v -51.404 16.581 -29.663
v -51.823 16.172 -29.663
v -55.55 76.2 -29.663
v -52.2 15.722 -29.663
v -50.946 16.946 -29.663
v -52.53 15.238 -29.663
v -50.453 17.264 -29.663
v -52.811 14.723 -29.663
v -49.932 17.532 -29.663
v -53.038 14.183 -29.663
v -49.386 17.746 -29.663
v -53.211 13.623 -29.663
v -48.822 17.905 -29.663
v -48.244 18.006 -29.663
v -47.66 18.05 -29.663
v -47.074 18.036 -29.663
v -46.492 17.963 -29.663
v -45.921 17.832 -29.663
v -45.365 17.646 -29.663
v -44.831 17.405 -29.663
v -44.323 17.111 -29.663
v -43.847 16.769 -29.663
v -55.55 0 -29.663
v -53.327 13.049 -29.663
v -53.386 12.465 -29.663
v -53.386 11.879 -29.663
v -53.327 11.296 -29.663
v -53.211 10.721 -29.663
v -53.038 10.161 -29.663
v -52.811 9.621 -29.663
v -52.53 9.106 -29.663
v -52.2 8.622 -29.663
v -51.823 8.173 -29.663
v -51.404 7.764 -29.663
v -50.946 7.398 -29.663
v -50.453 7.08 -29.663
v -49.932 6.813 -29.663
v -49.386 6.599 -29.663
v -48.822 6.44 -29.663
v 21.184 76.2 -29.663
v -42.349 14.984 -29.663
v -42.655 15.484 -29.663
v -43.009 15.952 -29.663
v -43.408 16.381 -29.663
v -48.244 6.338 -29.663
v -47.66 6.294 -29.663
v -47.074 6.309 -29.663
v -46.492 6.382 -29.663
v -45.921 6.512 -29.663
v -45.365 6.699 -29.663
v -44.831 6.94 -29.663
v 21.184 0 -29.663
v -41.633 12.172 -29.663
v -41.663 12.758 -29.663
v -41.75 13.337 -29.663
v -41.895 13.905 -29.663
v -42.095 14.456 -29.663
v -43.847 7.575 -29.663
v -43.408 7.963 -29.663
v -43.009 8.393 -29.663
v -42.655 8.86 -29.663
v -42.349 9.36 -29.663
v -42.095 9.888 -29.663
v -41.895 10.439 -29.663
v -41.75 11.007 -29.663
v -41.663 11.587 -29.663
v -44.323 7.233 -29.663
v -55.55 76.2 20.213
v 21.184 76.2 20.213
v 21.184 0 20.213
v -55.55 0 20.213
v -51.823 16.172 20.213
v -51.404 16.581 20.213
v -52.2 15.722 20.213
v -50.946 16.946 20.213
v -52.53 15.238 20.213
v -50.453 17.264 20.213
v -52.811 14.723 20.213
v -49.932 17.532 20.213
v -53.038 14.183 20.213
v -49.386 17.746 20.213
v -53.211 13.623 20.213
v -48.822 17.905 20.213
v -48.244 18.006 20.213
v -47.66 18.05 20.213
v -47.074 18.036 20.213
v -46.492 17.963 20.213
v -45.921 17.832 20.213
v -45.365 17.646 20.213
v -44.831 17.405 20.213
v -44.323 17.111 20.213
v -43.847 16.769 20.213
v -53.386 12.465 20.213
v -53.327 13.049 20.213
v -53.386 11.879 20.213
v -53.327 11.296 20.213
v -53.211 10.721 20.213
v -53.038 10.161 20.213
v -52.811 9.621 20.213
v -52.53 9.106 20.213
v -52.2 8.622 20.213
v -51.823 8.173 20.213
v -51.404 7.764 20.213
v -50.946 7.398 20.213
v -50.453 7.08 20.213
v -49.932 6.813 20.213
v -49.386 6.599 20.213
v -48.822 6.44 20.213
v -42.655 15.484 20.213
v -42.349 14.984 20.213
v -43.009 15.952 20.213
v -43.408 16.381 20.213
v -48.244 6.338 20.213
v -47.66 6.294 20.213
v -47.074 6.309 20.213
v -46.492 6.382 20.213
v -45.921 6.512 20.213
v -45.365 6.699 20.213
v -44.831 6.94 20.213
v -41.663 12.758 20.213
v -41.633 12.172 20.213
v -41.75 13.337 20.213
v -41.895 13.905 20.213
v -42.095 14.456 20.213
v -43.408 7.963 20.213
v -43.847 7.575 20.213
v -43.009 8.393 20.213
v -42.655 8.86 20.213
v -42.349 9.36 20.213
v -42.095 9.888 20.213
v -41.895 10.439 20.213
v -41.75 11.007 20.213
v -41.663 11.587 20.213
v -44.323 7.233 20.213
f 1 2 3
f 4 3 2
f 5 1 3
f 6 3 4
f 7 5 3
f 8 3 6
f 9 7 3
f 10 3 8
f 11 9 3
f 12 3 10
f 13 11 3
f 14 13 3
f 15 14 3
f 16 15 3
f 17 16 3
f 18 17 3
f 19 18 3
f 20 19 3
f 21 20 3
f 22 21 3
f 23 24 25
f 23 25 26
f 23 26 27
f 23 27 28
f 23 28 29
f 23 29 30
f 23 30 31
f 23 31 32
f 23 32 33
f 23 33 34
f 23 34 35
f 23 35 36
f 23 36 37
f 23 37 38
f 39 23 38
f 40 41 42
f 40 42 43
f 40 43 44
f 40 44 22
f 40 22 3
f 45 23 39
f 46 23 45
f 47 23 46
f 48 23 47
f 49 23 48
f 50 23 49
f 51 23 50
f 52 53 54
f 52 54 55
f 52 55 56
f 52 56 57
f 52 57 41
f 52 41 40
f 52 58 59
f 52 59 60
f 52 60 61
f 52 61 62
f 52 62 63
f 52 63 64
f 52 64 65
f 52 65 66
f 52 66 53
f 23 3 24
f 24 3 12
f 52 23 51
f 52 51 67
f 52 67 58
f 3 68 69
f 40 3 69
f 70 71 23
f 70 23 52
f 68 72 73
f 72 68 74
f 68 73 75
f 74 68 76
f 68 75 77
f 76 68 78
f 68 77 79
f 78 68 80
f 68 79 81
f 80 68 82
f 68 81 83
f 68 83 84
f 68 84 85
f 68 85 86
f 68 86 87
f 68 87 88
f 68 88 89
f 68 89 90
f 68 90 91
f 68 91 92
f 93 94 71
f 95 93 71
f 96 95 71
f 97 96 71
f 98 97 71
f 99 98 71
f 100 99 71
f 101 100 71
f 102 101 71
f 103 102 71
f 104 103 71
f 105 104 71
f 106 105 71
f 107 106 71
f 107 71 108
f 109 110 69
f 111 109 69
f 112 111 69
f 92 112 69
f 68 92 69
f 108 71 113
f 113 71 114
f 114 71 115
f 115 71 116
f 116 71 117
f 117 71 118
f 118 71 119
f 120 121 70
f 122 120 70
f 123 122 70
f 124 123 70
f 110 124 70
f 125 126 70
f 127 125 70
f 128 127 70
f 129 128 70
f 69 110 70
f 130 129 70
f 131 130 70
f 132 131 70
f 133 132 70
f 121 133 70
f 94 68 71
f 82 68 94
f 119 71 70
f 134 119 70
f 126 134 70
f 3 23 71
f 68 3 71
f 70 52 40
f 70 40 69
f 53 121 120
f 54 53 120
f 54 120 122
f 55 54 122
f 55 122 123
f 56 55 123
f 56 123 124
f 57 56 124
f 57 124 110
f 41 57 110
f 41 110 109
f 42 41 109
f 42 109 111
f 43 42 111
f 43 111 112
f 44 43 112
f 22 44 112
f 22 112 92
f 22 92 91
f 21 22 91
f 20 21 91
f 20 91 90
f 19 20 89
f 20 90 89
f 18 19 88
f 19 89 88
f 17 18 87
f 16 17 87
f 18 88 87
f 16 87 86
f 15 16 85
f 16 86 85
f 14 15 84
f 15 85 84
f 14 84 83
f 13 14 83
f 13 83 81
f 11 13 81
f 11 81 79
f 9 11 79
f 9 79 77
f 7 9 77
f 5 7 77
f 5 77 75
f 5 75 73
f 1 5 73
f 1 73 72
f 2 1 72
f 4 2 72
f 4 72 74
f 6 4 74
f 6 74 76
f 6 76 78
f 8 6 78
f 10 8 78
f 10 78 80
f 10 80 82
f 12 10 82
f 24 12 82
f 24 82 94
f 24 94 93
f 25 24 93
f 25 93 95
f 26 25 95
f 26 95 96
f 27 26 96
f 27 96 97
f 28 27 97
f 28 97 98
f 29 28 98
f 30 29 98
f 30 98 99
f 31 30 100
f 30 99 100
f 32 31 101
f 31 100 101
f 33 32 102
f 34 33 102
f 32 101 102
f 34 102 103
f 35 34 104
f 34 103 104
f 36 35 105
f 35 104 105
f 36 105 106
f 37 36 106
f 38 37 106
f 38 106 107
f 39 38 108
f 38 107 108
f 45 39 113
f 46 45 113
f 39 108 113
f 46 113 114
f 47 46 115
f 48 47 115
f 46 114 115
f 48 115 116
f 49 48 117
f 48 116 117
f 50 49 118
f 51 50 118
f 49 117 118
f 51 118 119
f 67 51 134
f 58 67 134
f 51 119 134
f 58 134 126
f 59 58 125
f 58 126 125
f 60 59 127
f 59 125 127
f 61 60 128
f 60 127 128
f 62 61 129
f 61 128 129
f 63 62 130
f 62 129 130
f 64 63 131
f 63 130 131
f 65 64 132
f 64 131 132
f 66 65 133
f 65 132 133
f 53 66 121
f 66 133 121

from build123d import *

# Parameters (mm, degrees)
F0_W     = 76.734344
F0_H     = 49.875418
F1_DEPTH = 76.2
F2_R     = 5.879825
F3_DEPTH = 50.8


with BuildPart() as f1:
    # F0 (on Front) → F1 (new body)
    with BuildSketch(Plane.XZ):
        with Locations((-17.182841, -4.724878)):
            Rectangle(F0_W, F0_H)
    extrude(amount=-F1_DEPTH)

    # F2 (on face) → F3 (cut)
    with BuildSketch(Plane.XY.offset(20.212831)):
        with Locations((-47.513243, 12.172232)):
            Circle(F2_R)
    extrude(amount=-F3_DEPTH, mode=Mode.SUBTRACT)


solid = f1.part
